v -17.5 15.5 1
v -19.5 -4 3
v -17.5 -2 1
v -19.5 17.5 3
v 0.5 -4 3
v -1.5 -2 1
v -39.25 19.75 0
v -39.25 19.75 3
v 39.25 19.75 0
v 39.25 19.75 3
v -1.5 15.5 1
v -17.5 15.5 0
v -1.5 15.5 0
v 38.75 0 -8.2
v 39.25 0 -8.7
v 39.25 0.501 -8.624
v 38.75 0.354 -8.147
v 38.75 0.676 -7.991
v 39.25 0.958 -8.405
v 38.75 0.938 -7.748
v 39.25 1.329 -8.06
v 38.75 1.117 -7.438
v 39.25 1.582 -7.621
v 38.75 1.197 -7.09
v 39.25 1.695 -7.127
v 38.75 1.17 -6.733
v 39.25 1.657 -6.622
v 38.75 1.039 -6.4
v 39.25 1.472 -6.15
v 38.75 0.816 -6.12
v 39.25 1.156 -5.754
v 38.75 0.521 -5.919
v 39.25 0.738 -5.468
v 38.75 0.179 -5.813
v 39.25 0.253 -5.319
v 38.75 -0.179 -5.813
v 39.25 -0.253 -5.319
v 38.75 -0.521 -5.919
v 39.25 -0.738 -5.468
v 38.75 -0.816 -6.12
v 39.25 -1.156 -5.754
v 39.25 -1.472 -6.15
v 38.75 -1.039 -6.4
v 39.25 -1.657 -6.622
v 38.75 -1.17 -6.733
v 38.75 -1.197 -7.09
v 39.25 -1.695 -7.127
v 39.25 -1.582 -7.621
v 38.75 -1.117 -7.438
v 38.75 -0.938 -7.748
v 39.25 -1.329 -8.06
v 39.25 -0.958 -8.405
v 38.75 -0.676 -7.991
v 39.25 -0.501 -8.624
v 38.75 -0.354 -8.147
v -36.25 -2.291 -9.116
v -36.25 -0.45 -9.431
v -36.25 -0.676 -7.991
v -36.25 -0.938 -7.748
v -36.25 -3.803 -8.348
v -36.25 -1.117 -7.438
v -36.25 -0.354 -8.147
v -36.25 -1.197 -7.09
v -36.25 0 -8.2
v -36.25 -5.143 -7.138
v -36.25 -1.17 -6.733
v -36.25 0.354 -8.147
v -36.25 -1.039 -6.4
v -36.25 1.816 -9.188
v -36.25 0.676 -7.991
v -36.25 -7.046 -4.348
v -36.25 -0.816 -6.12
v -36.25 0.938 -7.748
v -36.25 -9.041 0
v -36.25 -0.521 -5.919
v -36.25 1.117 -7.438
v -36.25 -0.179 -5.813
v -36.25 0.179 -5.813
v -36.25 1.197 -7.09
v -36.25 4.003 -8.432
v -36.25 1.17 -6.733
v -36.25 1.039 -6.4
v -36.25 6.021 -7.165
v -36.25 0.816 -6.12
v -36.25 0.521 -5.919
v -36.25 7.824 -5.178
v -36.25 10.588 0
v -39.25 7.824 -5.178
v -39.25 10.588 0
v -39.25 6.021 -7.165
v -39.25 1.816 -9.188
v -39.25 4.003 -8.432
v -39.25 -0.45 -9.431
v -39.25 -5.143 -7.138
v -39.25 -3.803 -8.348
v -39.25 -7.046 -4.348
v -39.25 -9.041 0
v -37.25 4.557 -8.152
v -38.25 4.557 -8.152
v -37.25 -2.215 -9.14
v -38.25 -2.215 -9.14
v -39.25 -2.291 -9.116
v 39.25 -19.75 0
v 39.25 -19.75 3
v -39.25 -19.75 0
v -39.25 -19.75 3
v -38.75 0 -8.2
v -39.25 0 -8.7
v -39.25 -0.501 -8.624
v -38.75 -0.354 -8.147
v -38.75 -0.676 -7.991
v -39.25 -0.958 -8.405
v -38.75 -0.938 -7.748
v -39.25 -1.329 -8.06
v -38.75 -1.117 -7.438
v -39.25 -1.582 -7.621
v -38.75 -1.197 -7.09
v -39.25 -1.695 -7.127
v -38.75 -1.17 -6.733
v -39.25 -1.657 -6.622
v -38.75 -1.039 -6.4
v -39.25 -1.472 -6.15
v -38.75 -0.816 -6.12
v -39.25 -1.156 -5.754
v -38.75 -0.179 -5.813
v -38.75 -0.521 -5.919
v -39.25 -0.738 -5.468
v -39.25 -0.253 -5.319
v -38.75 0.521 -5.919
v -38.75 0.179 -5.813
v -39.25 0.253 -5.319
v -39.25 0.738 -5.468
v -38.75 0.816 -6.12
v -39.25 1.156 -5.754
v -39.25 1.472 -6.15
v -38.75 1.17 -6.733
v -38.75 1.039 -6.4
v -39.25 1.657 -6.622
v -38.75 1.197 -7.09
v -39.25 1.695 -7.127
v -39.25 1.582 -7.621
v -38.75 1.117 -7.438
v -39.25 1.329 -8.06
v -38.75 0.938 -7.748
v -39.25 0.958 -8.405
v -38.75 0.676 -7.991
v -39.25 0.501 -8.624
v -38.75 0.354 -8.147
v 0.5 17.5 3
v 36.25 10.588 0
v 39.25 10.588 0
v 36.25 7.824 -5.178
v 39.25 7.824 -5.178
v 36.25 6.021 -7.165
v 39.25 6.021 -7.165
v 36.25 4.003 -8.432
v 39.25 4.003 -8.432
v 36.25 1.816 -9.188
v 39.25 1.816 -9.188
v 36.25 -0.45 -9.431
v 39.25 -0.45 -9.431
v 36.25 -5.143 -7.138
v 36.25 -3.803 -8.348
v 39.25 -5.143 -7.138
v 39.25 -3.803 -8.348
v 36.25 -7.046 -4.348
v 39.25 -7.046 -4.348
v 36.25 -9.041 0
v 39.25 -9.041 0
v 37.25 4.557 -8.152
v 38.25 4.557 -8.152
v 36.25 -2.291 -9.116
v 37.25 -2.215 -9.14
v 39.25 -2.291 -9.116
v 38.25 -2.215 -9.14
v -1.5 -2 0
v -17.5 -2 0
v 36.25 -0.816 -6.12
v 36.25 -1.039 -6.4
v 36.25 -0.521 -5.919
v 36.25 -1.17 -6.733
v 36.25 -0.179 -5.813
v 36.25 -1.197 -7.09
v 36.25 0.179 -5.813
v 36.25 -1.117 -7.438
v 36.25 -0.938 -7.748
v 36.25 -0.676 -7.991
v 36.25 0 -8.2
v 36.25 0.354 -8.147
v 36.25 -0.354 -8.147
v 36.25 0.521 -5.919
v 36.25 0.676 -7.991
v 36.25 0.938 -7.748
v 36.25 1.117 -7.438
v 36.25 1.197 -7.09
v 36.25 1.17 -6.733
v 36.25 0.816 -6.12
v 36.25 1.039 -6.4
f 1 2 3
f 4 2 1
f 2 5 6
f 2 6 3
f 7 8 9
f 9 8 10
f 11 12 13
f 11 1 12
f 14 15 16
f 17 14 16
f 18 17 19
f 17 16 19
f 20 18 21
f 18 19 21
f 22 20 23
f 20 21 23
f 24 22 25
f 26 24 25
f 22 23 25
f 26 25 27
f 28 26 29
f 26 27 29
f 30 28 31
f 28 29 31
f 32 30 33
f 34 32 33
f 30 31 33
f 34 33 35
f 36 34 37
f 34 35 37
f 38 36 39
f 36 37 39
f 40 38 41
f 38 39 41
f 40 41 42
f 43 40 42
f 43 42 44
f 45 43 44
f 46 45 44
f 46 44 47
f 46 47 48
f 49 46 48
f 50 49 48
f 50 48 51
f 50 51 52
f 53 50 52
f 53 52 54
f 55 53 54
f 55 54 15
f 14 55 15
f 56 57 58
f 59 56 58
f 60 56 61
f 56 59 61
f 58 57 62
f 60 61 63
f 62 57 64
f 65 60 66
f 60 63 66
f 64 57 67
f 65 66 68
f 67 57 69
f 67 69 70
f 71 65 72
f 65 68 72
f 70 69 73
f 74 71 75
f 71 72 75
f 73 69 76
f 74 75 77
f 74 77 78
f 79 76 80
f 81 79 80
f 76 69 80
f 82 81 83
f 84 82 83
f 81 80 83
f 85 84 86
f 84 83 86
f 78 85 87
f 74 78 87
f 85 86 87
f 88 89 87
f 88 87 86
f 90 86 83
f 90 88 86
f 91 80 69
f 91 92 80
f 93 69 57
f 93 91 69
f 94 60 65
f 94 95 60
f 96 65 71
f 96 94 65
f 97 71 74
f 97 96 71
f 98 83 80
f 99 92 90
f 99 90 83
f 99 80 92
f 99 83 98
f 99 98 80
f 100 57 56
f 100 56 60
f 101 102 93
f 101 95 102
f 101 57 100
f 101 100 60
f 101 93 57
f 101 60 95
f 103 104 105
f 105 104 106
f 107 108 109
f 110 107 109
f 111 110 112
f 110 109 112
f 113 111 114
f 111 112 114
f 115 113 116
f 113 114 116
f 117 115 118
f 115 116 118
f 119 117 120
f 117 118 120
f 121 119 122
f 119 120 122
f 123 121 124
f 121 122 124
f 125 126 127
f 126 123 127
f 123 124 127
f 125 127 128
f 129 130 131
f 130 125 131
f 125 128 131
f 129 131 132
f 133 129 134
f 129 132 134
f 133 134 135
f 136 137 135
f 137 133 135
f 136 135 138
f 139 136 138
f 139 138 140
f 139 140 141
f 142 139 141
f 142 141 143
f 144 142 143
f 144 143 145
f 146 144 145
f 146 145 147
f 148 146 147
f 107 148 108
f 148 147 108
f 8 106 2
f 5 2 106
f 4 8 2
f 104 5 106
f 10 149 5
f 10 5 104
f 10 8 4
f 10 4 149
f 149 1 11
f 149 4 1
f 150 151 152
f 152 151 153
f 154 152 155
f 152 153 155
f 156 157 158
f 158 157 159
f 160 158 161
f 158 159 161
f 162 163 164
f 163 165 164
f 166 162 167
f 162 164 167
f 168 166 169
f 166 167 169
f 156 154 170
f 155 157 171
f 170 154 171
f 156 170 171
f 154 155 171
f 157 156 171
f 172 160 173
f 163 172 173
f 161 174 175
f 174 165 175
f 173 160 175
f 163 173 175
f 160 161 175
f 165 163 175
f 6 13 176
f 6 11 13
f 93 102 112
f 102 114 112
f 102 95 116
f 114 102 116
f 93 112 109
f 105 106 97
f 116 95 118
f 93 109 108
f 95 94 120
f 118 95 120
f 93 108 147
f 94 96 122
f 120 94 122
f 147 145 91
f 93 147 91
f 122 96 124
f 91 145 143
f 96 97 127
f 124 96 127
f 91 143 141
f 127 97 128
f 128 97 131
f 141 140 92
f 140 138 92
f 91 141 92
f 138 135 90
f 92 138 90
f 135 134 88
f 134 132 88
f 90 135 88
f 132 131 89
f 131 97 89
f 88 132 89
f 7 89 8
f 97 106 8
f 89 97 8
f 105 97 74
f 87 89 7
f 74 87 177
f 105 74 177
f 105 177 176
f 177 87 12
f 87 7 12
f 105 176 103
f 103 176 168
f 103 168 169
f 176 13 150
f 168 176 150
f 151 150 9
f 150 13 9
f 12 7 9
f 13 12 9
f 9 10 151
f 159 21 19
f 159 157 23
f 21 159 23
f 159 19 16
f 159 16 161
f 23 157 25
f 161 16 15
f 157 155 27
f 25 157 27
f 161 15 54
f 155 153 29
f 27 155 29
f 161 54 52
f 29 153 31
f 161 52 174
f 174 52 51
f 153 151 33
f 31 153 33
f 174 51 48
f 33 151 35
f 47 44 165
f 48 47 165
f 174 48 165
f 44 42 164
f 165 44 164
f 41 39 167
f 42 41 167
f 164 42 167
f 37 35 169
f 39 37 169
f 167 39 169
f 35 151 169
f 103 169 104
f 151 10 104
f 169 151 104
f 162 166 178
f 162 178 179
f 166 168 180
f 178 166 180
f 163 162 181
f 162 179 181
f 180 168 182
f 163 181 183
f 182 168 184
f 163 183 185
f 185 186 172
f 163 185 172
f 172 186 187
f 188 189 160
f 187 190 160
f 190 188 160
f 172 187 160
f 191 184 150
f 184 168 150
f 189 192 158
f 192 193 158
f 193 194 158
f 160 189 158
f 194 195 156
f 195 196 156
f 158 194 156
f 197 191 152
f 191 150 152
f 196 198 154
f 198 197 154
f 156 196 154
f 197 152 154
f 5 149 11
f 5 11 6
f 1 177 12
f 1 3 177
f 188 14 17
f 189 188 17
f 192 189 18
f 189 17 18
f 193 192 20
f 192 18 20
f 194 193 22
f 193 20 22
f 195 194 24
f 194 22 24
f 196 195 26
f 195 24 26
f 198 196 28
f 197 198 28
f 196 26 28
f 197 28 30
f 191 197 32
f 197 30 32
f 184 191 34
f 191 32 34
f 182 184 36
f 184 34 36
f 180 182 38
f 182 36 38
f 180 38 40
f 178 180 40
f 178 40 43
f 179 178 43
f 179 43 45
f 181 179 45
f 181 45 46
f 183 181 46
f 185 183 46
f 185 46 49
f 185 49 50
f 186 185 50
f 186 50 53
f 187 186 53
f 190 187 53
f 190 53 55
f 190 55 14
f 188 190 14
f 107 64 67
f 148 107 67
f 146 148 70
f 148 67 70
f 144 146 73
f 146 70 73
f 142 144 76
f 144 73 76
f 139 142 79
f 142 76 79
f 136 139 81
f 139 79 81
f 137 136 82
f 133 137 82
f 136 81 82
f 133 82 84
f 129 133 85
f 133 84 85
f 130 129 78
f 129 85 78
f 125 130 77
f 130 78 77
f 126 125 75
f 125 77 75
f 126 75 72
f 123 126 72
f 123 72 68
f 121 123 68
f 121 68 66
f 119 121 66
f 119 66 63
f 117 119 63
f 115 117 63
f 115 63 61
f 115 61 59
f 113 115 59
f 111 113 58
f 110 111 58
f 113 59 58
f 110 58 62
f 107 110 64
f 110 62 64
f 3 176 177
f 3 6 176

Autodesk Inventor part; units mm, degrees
ref_plane "YZ Plane" through (0, 0, 0) normal (1, 0, 0) x (0, 1, 0)
ref_plane "XZ Plane" through (0, 0, 0) normal (0, 1, 0) x (-1, 0, 0)
ref_plane "XY Plane" through (0, 0, 0) normal (0, 0, 1) x (1, 0, 0)
sketch "Sketch1" plane through (0, 0, 0) normal (0, 0, 1) x (1, 0, 0)
  line L0 (40, 20.5) -> (40, -20.5) projected
  line L1 (-40, 20.5) -> (40, 20.5) projected
  line L2 (-40, -20.5) -> (-40, 20.5) projected
  line L3 (40, -20.5) -> (-40, -20.5) projected
  line L4 (40, 20.5) -> (40, -20.5) projected
  line L5 (40, -20.5) -> (-40, -20.5) projected
  line L6 (-40, -20.5) -> (-40, 20.5) projected
  line L7 (-40, 20.5) -> (40, 20.5) projected
  line L8 (37, 23.5) -> (-37, 23.5) projected
  line L9 (-43, 17.5) -> (-43, -17.5) projected
  line L10 (-37, -23.5) -> (37, -23.5) projected
  line L11 (43, -17.5) -> (43, 17.5) projected
  line L12 (34.23, -11.25) -> (34.23, 10.75) projected
  line L13 (5.23, -11.25) -> (34.23, -11.25) projected
  line L14 (5.23, 10.75) -> (5.23, -11.25) projected
  line L15 (34.23, 10.75) -> (5.23, 10.75) projected
  circle A0 centre (-26.5, 0.5) radius 5 projected
  arc A1 (37, -23.5) -> (43, -17.5) centre (37, -17.5) ccw projected
  arc A2 (43, 17.5) -> (37, 23.5) centre (37, 17.5) ccw projected
  arc A3 (-37, 23.5) -> (-43, 17.5) centre (-37, 17.5) ccw projected
  arc A4 (-43, -17.5) -> (-37, -23.5) centre (-37, -17.5) ccw projected
  point P0 (0, 0)
extrude "Extrusion1" add sketch "Sketch1" along normal blind 3 contours L0 L3 L2 L1 | A2 L11 A1 L10 A4 L9 A3 L8 | L13 L14 L15 L12 | A0
sketch "Sketch2" plane through (0, 0, 3) normal (0, 0, 1) x (1, 0, 0)
  line L0 (39.5, 20) -> (-39.5, 20) projected
  line L1 (-39.5, 20) -> (-39.5, -20) projected
  line L2 (-39.5, -20) -> (39.5, -20) projected
  line L3 (39.5, -20) -> (39.5, 20) projected
  line L4 (-17.5, 15.5) -> (-1.5, 15.5)
  line L5 (-1.5, 15.5) -> (-1.5, -2)
  line L6 (-1.5, -2) -> (-17.5, -2)
  line L7 (-17.5, -2) -> (-17.5, 15.5)
  line L8 (-17.5, 15.5) -> (-1.5, -2) construction
  line L9 (-1.5, 15.5) -> (-17.5, -2) construction
  point P0 (0, 0)
  point P1 (-9.5, 6.75)
  dimension "d2" = 16
  dimension "d3" = 17.5
  dimension "d4" = 18
  dimension "d6" = 41
extrude "Extrusion2" cut sketch "Sketch2" against normal blind 3 contours L4 L5 L6 L7
chamfer "Chamfer1" distance 2 angle 45 4 edges at (-1.5, 6.75, 3) (-17.5, 6.75, 3) (-9.5, -2, 3) (-9.5, 15.5, 3)
sketch "Sketch3" plane through (0, 0, 3) normal (0, 0, 1) x (1, 0, 0)
  line L0 (37, 23.5) -> (-37, 23.5) projected
  arc A0 (-37, 23.5) -> (-43, 17.5) centre (-37, 17.5) ccw projected
  line L1 (-43, 17.5) -> (-43, -17.5) projected
  arc A1 (-43, -17.5) -> (-37, -23.5) centre (-37, -17.5) ccw projected
  line L2 (-37, -23.5) -> (37, -23.5) projected
  arc A2 (37, -23.5) -> (43, -17.5) centre (37, -17.5) ccw projected
  line L3 (43, -17.5) -> (43, 17.5) projected
  arc A3 (43, 17.5) -> (37, 23.5) centre (37, 17.5) ccw projected
  line L4 (34.23, -11.25) -> (34.23, 10.75) projected
  line L5 (5.23, -11.25) -> (34.23, -11.25) projected
  line L6 (5.23, 10.75) -> (5.23, -11.25) projected
  line L7 (34.23, 10.75) -> (5.23, 10.75) projected
  line L8 (40, 20.5) -> (40, -20.5) projected
  line L9 (-40, 20.5) -> (40, 20.5) projected
  line L10 (-40, -20.5) -> (-40, 20.5) projected
  line L11 (40, -20.5) -> (-40, -20.5) projected
  circle A4 centre (-26.5, 0.5) radius 5 projected
  point P0 (0, 0)
extrude "Extrusion3" cut sketch "Sketch3" against normal blind 3 contours A3 L3 A2 L2 A1 L1 A0 L0
sketch "Sketch4" plane through (0, 0, 3) normal (0, 0, 1) x (1, 0, 0)
  line L0 (40, 20.5) -> (-40, 20.5) projected
  line L1 (-40, 20.5) -> (-40, -20.5) projected
  line L2 (-40, -20.5) -> (40, -20.5) projected
  line L3 (40, -20.5) -> (40, 20.5) projected
  line L4 (-39.25, 19.75) -> (39.25, 19.75)
  line L5 (39.25, 19.75) -> (39.25, -19.75)
  line L6 (39.25, -19.75) -> (-39.25, -19.75)
  line L7 (-39.25, -19.75) -> (-39.25, 19.75)
  line L8 (-39.25, 19.75) -> (39.25, -19.75) construction
  line L9 (39.25, 19.75) -> (-39.25, -19.75) construction
  point P0 (0, 0)
  dimension "d14" = 78.5
  dimension "d15" = 39.5
extrude "Extrusion4" cut sketch "Sketch4" against normal blind 3
sketch "Sketch5" plane through (0, 0, 0) normal (0, 0, -1) x (-1, 0, 0)
  line L0 (39.25, -19.75) -> (39.25, 19.75) projected
  line L1 (39.25, 19.75) -> (-39.25, 19.75) projected
  line L2 (-39.25, 19.75) -> (-39.25, -19.75) projected
  line L3 (-39.25, -19.75) -> (39.25, -19.75) projected
  line L4 (17.5, 15.5) -> (17.5, -2) projected
  line L5 (17.5, -2) -> (1.5, -2) projected
  line L6 (1.5, -2) -> (1.5, 15.5) projected
  line L7 (1.5, 15.5) -> (17.5, 15.5) projected
  point P0 (0, 0)
sketch "Sketch6" plane through (39.25, -19.75, 3) normal (1, 0, 0) x (0, 0, -1)
  line L0 (3, 39.5) -> (3, 0) projected
  line L1 (3, 30.3376) -> (7.1898, 28.4353) construction
  line L2 (7.1898, 28.4353) -> (10.8762, 26.1607) construction
  line L3 (10.8762, 26.1607) -> (12.9155, 21.0624) construction
  line L4 (12.9155, 21.0624) -> (12.9155, 15.718) construction
  line L5 (12.9155, 15.718) -> (7.6212, 12.5523) construction
  line L6 (7.6212, 12.5523) -> (3, 10.7087) construction
  spline S0 degree 4 poles (3, 30.3376) (7.1898, 28.4353) (10.8762, 26.1607) (12.9155, 21.0624) (12.9155, 15.718) (7.6212, 12.5523) (3, 10.7087) knots 1 1 1 1 1 2 3 4 4 4 4 4
  line L7 (3, 30.3376) -> (3, 10.7087)
  point P0 (3, 19.75)
extrude "Extrusion5" add sketch "Sketch6" against normal blind 3
sketch "Sketch7" plane through (-39.25, -19.75, 3) normal (-1, 0, 0) x (0, 0, 1)
  line L0 (-3, 30.3376) -> (-3, 10.7087) projected
  spline S0 degree 4 poles (-3, 30.3376) (-7.1898, 28.4353) (-10.8762, 26.1607) (-12.9155, 21.0624) (-12.9155, 15.718) (-7.6212, 12.5523) (-3, 10.7087) knots 0 0 0 0 0 0.333333 0.666667 1 1 1 1 1 projected
  point P0 (-3, 19.75)
extrude "Extrusion6" add sketch "Sketch7" against normal blind 3
sketch "Sketch8" plane through (39.25, -19.75, 3) normal (1, 0, 0) x (0, 0, -1)
  line L0 (0, 0) -> (0, 39.5) projected
  circle A0 centre (10, 19.75) radius 1.2
  point P0 (3, 19.75)
  dimension "d22" = 2.4
  dimension "d23" = 10
extrude "Extrusion7" cut sketch "Sketch8" against normal through all
chamfer "Chamfer2" distance 0.5 angle 45 2 edges at (39.25, 0, -5.8) (-39.25, 0, -5.8)
sketch "Sketch9" plane through (0, 0, 0) normal (0, 0, -1) x (-1, 0, 0)
  line L0 (39.25, -9.0413) -> (36.25, -9.0413) projected
  line L1 (36.25, -9.0413) -> (36.25, 10.5876) projected
  line L2 (36.25, 10.5876) -> (39.25, 10.5876) projected
  line L3 (39.25, 10.5876) -> (39.25, 19.75) projected
  line L4 (39.25, 19.75) -> (-39.25, 19.75) projected
  line L5 (-39.25, 19.75) -> (-39.25, 10.5876) projected
  line L6 (-39.25, 10.5876) -> (-36.25, 10.5876) projected
  line L7 (-36.25, 10.5876) -> (-36.25, -9.0413) projected
  line L8 (-36.25, -9.0413) -> (-39.25, -9.0413) projected
  line L9 (-39.25, -9.0413) -> (-39.25, -19.75) projected
  line L10 (-39.25, -19.75) -> (39.25, -19.75) projected
  line L11 (39.25, -19.75) -> (39.25, -9.0413) projected
  line L12 (17.5, 15.5) -> (17.5, -2) projected
  line L13 (17.5, -2) -> (1.5, -2) projected
  line L14 (1.5, -2) -> (1.5, 15.5) projected
  line L15 (1.5, 15.5) -> (17.5, 15.5) projected
  point P0 (0, 0)
properties part number "obudowa - timer- back"
